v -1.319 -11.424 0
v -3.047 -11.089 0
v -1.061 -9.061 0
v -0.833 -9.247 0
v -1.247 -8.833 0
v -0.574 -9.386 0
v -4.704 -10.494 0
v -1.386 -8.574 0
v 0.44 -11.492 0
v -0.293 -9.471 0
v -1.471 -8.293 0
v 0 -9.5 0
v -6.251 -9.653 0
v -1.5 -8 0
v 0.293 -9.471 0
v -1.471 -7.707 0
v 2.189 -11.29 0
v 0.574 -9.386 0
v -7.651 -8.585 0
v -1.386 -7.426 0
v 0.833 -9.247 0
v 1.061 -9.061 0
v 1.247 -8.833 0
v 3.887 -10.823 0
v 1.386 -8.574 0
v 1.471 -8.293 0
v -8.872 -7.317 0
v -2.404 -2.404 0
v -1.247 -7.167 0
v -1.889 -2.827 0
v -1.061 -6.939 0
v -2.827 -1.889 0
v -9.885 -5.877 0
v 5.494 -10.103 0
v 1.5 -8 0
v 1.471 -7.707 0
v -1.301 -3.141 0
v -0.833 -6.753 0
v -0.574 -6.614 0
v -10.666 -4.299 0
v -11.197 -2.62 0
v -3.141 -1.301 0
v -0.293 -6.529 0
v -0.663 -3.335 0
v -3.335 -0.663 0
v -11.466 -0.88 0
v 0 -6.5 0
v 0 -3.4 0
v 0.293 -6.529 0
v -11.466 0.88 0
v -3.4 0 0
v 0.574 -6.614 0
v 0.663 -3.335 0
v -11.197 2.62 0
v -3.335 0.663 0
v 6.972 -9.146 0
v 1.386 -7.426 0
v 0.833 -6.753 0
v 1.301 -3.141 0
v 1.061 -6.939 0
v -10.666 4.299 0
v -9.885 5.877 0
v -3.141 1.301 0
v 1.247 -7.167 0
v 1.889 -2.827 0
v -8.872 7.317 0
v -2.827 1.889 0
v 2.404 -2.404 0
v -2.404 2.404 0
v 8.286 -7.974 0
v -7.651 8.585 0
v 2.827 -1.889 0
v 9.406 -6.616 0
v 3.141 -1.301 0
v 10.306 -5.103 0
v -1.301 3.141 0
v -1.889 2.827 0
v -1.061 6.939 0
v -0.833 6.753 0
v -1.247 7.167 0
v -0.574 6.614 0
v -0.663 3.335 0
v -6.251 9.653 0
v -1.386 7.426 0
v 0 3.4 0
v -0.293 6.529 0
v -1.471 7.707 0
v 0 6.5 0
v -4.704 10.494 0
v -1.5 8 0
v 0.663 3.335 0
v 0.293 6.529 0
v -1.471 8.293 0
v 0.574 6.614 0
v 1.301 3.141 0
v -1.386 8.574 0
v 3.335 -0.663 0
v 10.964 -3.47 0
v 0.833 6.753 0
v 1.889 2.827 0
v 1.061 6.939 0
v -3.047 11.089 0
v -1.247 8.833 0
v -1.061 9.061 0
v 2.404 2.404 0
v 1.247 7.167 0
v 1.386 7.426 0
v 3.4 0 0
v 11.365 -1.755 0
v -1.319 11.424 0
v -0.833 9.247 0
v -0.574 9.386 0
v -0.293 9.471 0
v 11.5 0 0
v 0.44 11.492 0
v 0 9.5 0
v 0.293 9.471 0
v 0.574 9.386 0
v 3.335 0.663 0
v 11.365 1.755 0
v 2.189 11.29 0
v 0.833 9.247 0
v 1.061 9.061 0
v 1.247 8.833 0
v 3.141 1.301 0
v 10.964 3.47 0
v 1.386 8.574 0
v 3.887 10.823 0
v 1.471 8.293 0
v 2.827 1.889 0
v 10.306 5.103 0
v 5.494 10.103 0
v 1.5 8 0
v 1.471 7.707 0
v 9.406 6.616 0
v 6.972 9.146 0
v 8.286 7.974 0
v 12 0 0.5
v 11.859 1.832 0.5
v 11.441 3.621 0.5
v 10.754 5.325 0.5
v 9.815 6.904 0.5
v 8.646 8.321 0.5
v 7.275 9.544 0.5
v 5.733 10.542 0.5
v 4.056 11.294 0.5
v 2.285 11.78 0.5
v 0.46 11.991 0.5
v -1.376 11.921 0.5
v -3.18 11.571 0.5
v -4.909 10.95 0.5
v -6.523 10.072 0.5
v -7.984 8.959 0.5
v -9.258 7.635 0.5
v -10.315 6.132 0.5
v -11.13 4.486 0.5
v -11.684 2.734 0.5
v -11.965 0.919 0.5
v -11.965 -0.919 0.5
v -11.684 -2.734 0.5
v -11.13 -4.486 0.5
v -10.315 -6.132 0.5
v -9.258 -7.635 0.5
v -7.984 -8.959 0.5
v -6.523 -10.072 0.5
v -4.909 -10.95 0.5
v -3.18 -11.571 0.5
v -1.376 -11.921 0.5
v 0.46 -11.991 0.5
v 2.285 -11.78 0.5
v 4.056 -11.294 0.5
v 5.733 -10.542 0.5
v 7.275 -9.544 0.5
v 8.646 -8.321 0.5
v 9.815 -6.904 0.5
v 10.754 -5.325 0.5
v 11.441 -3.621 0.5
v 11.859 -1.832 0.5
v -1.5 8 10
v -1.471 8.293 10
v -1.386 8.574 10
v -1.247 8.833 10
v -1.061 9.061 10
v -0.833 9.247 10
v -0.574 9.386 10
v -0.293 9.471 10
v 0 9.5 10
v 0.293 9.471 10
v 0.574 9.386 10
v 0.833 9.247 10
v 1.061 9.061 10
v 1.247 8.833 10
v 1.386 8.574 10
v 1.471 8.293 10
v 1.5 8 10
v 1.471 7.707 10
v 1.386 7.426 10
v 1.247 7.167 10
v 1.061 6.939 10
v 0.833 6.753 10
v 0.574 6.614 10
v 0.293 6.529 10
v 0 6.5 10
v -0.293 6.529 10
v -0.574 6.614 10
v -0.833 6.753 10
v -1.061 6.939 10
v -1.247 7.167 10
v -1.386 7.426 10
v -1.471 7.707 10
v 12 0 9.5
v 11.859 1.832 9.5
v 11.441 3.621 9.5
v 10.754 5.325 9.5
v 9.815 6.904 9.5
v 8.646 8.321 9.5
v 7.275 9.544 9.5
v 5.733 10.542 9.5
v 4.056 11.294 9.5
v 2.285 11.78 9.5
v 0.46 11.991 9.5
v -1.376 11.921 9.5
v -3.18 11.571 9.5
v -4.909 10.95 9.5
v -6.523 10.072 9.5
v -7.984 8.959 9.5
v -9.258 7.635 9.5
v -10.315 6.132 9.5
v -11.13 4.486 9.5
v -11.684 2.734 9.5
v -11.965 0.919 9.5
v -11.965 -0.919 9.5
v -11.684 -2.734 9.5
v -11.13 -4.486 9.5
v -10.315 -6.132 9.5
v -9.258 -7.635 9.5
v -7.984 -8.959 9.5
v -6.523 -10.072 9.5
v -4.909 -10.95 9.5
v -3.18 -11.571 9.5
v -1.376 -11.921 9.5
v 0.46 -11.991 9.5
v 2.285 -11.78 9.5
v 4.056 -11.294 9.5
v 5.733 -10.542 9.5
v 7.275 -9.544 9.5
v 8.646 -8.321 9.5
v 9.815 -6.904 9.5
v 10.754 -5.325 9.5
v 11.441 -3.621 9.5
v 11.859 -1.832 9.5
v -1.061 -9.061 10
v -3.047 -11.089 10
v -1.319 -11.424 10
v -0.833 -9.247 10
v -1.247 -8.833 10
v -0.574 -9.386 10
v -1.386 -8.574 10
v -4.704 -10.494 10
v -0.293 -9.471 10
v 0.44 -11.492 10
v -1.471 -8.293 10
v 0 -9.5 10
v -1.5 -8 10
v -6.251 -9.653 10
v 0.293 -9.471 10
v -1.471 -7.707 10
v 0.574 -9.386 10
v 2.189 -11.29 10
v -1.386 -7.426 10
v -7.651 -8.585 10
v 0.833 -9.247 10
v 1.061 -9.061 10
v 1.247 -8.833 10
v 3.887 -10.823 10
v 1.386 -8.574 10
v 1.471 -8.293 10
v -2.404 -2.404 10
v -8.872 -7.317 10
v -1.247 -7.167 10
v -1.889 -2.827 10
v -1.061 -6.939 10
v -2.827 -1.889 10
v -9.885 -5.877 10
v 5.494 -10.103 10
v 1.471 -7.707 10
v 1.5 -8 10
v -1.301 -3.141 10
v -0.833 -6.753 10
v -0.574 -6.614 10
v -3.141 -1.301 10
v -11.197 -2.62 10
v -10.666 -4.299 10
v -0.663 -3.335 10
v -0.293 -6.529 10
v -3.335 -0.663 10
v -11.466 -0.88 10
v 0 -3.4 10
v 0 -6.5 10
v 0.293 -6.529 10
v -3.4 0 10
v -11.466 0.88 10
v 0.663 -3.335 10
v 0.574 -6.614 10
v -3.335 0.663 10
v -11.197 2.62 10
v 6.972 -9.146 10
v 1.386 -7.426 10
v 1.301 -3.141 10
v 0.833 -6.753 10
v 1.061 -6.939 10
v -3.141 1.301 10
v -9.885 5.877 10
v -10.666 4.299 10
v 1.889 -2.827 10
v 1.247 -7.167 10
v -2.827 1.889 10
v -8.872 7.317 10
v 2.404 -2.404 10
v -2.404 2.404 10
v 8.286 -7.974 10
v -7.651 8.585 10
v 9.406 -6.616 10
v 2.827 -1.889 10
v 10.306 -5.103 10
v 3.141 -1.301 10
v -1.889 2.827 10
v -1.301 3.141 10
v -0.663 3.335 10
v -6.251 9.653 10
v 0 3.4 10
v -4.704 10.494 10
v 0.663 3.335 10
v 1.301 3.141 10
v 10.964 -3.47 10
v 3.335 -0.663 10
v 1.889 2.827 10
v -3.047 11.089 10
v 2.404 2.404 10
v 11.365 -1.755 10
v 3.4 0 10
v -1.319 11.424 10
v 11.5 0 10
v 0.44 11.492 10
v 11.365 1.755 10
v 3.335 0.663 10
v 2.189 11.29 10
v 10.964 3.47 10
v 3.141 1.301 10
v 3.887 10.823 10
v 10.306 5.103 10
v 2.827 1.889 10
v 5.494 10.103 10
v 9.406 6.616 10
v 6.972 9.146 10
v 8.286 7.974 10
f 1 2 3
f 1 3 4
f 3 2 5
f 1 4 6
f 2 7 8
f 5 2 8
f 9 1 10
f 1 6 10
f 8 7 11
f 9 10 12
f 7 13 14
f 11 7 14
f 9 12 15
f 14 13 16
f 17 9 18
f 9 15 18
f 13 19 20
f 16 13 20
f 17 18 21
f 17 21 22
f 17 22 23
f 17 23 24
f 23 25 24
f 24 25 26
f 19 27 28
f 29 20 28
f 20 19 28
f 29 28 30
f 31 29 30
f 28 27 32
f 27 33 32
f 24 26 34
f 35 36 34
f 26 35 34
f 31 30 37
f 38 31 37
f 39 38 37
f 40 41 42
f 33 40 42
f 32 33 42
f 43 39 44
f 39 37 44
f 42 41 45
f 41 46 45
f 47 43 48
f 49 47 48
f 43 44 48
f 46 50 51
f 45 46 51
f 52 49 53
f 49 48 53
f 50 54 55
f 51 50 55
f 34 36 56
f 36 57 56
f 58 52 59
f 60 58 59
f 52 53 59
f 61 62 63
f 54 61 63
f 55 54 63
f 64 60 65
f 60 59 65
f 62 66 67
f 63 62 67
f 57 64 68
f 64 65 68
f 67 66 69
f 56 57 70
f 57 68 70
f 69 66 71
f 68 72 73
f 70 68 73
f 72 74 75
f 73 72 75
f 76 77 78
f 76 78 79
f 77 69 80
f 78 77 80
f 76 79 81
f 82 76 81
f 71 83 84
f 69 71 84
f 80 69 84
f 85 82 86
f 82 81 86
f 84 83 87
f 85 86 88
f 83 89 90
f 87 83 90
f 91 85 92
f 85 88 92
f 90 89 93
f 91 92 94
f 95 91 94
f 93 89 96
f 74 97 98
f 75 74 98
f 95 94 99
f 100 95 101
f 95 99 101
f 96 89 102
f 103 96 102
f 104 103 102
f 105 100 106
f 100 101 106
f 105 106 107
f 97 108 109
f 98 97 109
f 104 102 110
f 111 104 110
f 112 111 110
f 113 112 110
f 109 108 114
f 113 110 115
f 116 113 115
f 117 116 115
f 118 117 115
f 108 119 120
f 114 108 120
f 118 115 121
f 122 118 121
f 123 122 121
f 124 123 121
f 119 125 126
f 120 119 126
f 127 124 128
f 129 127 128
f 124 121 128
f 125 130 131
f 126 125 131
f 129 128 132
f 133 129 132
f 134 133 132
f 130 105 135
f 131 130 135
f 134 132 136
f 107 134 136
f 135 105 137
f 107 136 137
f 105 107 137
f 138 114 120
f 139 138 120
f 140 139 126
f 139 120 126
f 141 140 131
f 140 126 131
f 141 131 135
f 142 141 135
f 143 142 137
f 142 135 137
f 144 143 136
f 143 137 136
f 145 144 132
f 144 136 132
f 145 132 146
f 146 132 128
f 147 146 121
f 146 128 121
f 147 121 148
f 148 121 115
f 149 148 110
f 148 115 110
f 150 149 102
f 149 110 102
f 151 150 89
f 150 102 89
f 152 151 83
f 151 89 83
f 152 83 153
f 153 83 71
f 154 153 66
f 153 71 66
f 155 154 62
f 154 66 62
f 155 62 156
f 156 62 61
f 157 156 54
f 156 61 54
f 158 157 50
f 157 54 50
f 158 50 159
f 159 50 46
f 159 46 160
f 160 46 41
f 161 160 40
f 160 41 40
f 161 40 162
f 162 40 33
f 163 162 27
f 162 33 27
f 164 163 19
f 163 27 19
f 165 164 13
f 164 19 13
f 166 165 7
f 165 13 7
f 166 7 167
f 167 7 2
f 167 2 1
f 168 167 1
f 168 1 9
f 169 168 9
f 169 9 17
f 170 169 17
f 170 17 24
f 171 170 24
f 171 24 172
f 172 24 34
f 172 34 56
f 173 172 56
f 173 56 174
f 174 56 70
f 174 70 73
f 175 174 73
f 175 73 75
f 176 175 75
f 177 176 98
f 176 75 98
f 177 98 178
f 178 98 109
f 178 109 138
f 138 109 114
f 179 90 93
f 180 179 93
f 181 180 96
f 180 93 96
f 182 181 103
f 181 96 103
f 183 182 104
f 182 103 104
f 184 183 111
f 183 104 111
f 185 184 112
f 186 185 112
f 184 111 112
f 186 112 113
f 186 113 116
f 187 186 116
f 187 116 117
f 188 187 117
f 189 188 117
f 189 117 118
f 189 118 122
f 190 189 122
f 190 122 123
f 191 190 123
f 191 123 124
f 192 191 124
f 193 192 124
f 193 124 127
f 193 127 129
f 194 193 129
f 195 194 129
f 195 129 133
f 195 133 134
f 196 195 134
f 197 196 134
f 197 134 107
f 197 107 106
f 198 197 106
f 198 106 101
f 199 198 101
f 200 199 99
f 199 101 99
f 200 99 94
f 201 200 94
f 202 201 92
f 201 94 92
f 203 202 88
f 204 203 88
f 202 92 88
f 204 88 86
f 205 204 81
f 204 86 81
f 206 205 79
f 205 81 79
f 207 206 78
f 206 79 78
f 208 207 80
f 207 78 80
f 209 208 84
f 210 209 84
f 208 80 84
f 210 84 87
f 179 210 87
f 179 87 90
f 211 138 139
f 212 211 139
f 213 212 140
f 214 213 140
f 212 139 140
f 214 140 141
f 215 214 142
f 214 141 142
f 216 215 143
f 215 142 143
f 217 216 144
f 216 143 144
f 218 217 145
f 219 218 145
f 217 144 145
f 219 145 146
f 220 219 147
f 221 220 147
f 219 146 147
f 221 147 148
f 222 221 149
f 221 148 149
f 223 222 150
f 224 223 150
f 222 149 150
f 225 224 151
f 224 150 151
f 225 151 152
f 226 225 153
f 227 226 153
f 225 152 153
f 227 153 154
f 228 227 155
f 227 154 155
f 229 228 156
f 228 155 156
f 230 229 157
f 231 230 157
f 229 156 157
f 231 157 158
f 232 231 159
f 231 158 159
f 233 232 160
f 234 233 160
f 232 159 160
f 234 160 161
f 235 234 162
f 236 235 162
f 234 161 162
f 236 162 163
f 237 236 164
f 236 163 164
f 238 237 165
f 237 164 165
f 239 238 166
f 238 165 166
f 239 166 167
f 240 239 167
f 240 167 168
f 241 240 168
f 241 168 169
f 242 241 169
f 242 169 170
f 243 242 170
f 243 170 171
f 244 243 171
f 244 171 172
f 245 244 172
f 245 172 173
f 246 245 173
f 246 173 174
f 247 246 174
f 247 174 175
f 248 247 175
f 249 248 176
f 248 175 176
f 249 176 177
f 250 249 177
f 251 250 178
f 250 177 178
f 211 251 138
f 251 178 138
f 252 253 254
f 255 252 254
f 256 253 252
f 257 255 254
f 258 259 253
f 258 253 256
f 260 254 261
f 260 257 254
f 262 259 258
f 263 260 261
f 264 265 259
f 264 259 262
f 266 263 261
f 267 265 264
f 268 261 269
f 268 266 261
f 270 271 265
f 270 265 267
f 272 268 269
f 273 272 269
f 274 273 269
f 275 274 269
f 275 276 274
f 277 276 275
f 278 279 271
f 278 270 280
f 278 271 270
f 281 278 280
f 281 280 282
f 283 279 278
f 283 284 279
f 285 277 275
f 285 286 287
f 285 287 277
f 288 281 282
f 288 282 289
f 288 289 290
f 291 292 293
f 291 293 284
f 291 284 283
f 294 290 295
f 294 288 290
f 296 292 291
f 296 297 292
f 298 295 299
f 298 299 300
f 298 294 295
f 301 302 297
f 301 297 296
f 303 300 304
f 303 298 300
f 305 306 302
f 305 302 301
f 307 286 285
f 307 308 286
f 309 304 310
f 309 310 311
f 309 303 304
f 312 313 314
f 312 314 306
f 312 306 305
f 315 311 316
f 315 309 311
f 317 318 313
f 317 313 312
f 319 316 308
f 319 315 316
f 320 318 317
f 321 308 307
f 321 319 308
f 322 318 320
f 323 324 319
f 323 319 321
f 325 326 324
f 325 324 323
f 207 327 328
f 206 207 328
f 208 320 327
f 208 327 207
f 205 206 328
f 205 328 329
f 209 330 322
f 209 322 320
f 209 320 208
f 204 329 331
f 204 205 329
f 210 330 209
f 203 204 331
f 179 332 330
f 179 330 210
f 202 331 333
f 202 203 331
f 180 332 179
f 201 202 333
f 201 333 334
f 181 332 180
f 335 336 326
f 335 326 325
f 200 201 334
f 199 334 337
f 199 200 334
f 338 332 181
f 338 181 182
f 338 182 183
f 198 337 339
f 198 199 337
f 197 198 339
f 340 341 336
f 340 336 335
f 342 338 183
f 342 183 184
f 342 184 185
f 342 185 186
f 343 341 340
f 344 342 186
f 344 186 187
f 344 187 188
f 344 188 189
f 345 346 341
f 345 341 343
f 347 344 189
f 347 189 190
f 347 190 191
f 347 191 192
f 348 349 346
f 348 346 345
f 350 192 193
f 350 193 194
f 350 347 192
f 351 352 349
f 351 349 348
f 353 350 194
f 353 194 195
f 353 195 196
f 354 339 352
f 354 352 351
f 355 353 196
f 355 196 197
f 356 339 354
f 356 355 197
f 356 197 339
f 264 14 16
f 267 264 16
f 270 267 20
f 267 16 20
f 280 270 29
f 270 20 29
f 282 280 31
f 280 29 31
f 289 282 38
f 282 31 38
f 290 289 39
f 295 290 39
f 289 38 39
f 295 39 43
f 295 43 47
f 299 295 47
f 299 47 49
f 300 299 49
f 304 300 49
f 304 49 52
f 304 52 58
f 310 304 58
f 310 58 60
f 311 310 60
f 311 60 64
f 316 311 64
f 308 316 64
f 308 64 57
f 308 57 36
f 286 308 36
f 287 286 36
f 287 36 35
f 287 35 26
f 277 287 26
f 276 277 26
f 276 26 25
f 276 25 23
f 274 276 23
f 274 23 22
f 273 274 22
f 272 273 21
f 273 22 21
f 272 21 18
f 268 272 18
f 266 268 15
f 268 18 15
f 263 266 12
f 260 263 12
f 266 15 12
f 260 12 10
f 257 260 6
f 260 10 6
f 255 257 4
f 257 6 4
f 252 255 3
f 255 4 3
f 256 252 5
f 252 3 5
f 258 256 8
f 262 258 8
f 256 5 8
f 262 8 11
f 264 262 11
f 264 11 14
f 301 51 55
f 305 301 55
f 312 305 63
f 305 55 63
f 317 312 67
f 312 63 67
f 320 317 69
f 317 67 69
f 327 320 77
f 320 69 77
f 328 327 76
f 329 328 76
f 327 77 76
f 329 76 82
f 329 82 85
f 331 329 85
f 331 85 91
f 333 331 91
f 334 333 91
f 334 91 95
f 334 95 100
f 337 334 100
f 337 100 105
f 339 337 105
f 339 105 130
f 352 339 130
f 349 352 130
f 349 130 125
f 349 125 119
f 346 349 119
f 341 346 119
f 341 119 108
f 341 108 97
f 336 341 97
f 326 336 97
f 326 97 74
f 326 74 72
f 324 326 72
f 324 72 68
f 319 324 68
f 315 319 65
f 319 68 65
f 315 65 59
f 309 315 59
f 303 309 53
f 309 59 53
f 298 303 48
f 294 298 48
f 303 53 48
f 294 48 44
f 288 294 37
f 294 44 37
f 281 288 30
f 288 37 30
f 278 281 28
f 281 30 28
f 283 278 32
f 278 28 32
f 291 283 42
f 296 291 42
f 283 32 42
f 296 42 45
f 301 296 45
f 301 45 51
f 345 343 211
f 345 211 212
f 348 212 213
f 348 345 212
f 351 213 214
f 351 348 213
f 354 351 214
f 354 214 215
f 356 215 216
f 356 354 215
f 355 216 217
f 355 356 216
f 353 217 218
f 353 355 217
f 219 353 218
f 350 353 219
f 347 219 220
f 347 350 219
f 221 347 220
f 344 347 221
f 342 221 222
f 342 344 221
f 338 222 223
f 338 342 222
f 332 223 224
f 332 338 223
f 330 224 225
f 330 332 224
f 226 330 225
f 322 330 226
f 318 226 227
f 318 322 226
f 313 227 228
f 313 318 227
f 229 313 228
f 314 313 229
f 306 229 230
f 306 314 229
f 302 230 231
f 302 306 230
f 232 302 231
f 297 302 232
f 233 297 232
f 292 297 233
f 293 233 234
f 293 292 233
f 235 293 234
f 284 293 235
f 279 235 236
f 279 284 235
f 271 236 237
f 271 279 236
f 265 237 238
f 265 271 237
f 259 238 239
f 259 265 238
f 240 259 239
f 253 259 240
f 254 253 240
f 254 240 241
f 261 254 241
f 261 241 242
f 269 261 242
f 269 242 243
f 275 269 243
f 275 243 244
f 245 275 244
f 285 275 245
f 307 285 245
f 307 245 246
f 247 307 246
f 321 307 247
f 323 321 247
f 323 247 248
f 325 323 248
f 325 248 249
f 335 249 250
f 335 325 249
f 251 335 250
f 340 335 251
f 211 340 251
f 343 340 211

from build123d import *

# Parameters (mm, degrees)
SKETCH_1_R             = 12
EXTRUDE_1_DEPTH        = 10
CHAMFER_1_SIZE         = 0.5
HOLE_WIZARD_M8_1_D     = 6.8
HOLE_WIZARD_M8_1_DEPTH = 17.707073895
HOLE_WIZARD_M8_1_TIP   = 2.042926105
F_3_0MM_1_D            = 3
F_3_0MM_1_DEPTH        = 18.848709071
F_3_0MM_1_TIP          = 0.901290929


with BuildPart() as part:
    # 草图1 → 凸台-拉伸1 (new body)
    with BuildSketch(Plane.XY):
        Circle(SKETCH_1_R)
    extrude(amount=EXTRUDE_1_DEPTH)

    # 倒角1
    chamfer_1_edges = [part.edges().sort_by_distance(p)[0] for p in [
        (-12, 0, 0),
        (-12, 0, 10),
    ]]
    chamfer(chamfer_1_edges, length=CHAMFER_1_SIZE)

    # M8 螺纹孔1
    with Locations(Plane.XY.offset(10)):
        with Locations((0, 0)):
            Hole(HOLE_WIZARD_M8_1_D / 2, depth=HOLE_WIZARD_M8_1_DEPTH)
            with Locations((0, 0, -(HOLE_WIZARD_M8_1_DEPTH + HOLE_WIZARD_M8_1_TIP / 2))):  # 118° drill point
                Cone(0, HOLE_WIZARD_M8_1_D / 2, HOLE_WIZARD_M8_1_TIP, mode=Mode.SUBTRACT)

    # Ø3.0mm 暗销孔1
    with Locations(Plane.XY.offset(10)):
        with Locations((0, -8), (0, 8)):
            Hole(F_3_0MM_1_D / 2, depth=F_3_0MM_1_DEPTH)
            with Locations((0, 0, -(F_3_0MM_1_DEPTH + F_3_0MM_1_TIP / 2))):  # 118° drill point
                Cone(0, F_3_0MM_1_D / 2, F_3_0MM_1_TIP, mode=Mode.SUBTRACT)


solid = part.part
